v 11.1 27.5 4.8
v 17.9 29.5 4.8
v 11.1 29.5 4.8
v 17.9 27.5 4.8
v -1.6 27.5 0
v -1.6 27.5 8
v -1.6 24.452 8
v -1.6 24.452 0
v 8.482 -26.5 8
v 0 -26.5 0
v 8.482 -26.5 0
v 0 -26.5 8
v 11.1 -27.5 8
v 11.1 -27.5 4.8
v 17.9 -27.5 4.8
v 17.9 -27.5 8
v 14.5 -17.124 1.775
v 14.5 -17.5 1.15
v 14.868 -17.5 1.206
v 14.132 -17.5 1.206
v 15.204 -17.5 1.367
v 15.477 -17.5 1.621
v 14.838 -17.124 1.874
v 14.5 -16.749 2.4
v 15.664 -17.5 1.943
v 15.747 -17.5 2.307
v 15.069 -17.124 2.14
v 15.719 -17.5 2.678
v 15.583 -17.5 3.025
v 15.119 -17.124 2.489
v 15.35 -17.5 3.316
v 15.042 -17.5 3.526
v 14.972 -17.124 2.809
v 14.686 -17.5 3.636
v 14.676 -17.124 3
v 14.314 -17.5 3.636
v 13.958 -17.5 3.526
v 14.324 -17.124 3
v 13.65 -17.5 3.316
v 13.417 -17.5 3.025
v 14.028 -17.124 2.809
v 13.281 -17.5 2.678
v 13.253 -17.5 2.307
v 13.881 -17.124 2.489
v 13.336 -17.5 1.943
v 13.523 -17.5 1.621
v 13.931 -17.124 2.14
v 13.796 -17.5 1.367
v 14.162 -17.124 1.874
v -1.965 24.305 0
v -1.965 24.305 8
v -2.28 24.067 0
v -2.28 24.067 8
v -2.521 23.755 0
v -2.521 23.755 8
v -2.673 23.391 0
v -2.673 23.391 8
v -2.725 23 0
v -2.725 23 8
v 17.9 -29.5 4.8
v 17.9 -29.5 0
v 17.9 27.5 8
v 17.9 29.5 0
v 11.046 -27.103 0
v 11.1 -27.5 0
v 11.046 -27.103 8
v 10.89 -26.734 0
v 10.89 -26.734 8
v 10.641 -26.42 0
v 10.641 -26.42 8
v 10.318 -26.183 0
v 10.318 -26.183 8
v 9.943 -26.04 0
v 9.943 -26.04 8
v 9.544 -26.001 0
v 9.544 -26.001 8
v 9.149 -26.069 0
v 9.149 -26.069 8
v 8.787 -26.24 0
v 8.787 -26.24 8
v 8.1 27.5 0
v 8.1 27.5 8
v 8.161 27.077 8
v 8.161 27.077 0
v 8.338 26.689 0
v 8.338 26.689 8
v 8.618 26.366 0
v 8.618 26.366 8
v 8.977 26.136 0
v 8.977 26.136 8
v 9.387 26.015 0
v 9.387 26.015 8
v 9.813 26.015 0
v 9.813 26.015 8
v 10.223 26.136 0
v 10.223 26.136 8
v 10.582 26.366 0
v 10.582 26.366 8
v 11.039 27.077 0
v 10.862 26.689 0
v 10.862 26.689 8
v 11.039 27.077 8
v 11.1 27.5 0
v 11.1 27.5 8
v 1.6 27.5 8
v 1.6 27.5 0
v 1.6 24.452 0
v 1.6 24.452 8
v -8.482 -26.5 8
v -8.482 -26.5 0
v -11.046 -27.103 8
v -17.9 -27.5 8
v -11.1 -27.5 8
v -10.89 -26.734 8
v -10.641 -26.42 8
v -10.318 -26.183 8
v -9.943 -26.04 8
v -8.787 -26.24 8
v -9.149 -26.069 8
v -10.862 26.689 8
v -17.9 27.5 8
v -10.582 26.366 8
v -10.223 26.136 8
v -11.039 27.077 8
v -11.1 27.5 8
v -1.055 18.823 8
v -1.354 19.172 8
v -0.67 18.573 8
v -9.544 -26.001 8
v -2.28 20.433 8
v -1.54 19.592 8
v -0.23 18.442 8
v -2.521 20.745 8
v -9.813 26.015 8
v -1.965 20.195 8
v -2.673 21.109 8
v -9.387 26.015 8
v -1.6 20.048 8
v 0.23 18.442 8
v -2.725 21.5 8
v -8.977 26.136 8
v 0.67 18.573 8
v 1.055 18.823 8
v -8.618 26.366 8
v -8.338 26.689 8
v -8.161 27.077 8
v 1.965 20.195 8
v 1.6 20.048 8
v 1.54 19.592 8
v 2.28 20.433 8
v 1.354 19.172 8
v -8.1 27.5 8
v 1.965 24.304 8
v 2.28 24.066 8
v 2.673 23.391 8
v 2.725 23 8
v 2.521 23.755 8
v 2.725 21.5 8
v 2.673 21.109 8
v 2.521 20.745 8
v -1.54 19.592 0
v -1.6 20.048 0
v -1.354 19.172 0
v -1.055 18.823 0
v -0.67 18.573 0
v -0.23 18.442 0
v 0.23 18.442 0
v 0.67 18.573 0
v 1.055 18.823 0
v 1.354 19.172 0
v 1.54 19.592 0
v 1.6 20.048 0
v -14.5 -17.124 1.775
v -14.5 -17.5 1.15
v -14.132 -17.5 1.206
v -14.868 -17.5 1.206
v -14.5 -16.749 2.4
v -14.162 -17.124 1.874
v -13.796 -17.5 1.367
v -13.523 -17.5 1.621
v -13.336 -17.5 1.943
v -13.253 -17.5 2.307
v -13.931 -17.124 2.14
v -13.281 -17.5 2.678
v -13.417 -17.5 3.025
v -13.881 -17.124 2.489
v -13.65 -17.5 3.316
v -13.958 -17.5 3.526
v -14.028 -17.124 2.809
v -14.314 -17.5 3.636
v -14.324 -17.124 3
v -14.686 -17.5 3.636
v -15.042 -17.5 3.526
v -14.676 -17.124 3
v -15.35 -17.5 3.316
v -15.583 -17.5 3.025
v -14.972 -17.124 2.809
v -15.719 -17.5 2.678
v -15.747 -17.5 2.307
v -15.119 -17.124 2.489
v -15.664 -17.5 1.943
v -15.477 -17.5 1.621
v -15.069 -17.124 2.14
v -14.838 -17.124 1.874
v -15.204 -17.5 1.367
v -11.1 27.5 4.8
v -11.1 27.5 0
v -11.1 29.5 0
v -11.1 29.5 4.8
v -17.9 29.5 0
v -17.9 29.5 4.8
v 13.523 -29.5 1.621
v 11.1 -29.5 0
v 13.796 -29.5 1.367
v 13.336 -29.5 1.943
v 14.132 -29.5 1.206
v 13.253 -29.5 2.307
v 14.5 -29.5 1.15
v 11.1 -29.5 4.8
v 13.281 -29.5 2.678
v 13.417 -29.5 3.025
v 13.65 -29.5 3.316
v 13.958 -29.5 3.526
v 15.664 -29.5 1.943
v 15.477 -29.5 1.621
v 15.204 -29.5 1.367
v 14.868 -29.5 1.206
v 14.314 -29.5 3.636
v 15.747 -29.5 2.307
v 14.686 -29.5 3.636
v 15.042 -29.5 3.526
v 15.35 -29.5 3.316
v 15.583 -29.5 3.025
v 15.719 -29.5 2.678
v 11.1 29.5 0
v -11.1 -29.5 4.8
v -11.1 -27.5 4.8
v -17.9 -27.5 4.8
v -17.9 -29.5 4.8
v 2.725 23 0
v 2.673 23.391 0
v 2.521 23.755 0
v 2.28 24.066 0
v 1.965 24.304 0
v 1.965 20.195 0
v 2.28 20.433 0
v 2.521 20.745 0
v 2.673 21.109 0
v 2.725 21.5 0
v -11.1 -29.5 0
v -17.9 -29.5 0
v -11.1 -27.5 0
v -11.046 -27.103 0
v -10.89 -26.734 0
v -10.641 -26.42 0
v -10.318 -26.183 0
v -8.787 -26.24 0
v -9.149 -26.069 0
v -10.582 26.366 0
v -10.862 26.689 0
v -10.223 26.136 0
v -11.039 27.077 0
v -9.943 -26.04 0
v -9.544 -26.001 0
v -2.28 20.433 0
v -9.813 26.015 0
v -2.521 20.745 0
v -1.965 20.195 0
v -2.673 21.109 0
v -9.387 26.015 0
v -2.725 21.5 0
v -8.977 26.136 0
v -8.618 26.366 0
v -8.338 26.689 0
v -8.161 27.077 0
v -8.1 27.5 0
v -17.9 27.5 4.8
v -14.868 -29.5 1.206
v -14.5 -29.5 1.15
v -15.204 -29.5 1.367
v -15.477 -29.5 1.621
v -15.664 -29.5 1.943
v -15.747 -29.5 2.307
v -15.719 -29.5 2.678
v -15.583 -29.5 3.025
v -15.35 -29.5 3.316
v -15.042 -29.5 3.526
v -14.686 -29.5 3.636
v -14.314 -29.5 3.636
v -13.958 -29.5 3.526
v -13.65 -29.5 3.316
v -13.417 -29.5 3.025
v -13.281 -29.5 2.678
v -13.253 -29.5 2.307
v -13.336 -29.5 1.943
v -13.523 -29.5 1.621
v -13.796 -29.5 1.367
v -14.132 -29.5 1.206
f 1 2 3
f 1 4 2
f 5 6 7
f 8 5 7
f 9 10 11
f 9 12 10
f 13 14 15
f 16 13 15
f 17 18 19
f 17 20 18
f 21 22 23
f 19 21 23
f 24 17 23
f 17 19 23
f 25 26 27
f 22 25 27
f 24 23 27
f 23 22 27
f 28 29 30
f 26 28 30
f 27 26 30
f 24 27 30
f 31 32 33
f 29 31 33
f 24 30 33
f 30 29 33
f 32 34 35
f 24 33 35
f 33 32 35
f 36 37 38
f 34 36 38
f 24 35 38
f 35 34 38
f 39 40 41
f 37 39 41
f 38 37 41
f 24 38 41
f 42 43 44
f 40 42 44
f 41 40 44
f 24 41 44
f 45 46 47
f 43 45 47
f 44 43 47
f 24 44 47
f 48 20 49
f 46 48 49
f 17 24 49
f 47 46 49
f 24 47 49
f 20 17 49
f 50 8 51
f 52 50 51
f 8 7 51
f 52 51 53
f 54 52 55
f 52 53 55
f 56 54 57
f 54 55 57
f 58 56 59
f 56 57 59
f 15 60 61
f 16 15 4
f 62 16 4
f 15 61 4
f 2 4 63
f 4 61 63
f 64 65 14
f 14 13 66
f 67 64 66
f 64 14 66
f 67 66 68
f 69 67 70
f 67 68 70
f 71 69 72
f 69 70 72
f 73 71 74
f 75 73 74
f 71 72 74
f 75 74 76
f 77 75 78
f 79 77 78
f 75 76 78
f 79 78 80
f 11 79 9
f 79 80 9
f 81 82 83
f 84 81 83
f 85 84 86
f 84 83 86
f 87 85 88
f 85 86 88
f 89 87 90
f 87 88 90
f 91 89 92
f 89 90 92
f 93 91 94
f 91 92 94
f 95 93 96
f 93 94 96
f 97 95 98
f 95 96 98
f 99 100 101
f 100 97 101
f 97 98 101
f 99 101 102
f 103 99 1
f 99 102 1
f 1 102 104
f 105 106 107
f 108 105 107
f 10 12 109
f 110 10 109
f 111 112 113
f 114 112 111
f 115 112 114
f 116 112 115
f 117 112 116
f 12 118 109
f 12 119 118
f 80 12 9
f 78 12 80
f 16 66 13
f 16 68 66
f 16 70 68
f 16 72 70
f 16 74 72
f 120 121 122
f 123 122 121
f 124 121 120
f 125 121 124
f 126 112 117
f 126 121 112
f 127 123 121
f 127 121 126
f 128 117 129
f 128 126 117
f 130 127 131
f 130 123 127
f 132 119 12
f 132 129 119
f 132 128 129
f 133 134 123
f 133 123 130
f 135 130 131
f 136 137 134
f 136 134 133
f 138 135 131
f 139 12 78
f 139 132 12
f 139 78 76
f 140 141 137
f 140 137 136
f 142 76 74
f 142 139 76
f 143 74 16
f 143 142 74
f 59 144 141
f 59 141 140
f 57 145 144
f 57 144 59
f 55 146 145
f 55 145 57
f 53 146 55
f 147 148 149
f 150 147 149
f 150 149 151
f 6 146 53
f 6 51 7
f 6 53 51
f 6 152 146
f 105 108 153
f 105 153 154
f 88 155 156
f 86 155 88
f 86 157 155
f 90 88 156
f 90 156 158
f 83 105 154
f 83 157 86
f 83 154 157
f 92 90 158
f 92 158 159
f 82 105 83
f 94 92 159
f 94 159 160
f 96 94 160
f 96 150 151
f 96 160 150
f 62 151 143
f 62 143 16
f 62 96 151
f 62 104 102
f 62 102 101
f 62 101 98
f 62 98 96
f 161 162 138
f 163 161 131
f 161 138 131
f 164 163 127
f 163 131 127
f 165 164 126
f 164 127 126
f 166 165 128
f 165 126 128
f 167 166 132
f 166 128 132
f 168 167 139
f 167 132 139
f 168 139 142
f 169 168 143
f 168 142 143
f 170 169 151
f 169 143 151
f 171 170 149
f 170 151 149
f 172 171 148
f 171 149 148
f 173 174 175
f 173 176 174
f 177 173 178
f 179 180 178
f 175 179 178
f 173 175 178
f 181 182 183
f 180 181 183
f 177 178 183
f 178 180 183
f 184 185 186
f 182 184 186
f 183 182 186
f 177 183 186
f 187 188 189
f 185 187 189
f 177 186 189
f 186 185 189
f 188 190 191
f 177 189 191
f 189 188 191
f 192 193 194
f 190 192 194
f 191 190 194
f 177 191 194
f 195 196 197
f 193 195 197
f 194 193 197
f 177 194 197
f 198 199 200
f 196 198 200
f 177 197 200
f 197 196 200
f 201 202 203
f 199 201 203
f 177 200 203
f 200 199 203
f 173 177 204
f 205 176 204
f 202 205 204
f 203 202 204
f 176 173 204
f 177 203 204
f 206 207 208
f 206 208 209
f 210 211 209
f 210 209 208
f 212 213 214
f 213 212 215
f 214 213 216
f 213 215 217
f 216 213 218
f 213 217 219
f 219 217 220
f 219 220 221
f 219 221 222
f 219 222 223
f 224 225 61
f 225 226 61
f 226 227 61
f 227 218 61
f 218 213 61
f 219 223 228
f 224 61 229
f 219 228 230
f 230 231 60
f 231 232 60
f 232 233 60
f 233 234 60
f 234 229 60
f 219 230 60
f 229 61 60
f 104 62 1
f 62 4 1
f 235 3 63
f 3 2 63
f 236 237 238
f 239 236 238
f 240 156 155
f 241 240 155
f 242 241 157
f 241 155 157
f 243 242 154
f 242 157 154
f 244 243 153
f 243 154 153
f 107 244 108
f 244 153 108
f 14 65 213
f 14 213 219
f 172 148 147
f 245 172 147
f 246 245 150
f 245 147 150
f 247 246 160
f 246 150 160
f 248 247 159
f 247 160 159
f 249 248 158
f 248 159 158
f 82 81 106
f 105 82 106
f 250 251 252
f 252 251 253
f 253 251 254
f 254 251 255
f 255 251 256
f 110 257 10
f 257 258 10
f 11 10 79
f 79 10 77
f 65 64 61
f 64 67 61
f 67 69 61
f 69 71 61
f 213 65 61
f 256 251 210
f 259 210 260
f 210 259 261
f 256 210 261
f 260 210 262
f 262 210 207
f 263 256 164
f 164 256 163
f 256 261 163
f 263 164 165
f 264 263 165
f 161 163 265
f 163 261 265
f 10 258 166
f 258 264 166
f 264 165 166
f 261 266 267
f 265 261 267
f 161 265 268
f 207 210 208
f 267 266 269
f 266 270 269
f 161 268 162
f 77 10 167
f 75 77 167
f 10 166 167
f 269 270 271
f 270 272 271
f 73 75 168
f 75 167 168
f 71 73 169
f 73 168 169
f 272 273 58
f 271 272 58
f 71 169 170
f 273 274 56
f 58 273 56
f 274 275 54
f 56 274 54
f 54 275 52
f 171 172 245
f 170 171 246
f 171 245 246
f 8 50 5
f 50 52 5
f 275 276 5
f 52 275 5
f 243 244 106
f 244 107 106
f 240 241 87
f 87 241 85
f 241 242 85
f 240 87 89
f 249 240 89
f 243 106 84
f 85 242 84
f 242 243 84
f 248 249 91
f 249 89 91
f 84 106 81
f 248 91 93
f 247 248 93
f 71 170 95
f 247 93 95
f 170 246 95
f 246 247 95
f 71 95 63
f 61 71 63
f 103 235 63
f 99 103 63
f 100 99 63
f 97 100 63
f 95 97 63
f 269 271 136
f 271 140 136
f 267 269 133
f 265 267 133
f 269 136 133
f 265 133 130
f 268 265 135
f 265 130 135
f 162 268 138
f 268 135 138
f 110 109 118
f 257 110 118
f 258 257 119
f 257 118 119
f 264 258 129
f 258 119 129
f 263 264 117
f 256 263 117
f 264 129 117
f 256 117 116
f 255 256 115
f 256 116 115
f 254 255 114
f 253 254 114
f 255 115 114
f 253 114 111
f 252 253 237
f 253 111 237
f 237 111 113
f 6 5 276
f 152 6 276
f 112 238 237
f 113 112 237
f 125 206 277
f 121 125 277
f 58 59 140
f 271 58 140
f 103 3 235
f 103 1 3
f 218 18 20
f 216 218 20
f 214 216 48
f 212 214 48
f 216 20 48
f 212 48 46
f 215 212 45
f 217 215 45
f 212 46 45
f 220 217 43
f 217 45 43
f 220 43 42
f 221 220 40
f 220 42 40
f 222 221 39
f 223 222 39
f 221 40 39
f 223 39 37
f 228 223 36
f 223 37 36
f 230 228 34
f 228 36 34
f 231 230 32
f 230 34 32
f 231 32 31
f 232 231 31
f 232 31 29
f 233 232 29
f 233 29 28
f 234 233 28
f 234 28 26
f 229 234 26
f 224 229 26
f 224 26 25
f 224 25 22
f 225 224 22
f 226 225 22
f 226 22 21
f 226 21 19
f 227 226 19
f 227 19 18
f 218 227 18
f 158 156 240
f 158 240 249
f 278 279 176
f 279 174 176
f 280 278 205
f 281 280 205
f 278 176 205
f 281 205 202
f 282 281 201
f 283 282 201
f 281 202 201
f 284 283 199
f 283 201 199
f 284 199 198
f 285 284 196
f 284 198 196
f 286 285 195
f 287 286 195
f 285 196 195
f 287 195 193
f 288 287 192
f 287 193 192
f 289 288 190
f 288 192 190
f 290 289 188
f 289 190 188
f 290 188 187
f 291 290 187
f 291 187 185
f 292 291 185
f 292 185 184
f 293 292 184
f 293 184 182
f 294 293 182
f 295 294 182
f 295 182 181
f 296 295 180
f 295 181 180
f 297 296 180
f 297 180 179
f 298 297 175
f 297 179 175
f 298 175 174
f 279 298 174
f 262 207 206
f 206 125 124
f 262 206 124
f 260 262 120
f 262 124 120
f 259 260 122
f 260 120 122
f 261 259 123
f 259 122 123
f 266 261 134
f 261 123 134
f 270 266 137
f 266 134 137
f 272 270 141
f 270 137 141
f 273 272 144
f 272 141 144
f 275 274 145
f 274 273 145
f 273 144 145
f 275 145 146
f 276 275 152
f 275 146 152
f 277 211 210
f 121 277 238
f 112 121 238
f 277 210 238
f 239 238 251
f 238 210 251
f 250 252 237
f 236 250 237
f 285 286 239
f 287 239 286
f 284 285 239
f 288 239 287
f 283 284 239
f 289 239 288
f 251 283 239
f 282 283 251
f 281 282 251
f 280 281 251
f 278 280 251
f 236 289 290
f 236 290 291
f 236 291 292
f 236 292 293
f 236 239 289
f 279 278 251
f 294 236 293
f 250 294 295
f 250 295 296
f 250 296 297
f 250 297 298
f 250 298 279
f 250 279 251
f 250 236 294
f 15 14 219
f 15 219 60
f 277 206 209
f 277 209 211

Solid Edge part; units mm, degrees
sketch "Sketch1" plane through (0, 0, 0) normal (0, 0, 1) x (1, 0, 0)
  line L0 (-17.9, -27.5) -> (17.9, -27.5)
  line L1 (17.9, -27.5) -> (17.9, 27.5)
  line L2 (17.9, 27.5) -> (-17.9, 27.5)
  line L3 (-17.9, 27.5) -> (-17.9, -27.5)
extrude "Protrusion1" add sketch "Sketch1" along normal blind 8
sketch "Sketch2" plane through (0, -27.5, 4) normal (0, -1, 0) x (1, 0, 0)
  line L0 (-11.1, 0.8) -> (-17.9, 0.8)
  line L1 (-17.9, 0.8) -> (-17.9, -4)
  line L2 (-17.9, -4) -> (-11.1, -4)
  line L3 (-11.1, -4) -> (-11.1, 0.8)
  line L4 (11.1, 0.8) -> (17.9, 0.8)
  line L5 (17.9, 0.8) -> (17.9, -4)
  line L6 (17.9, -4) -> (11.1, -4)
  line L7 (11.1, -4) -> (11.1, 0.8)
extrude "ExtrudedProtrusion_2" add sketch "Sketch2" along normal blind 2
sketch "Sketch3" plane through (0, 27.5, 4) normal (0, 1, 0) x (-1, 0, 0)
  line L0 (-17.9, 0.8) -> (-11.1, 0.8)
  line L1 (-11.1, 0.8) -> (-11.1, -4)
  line L2 (-11.1, -4) -> (-17.9, -4)
  line L3 (-17.9, -4) -> (-17.9, 0.8)
  line L4 (11.1, 0.8) -> (17.9, 0.8)
  line L5 (17.9, 0.8) -> (17.9, -4)
  line L6 (17.9, -4) -> (11.1, -4)
  line L7 (11.1, -4) -> (11.1, 0.8)
extrude "ExtrudedProtrusion_3" add sketch "Sketch3" along normal blind 2
hole "Hole_3" at (-14.5, -29.5, 2.4) direction (0, 1, 0) diameter 2.5 depth 12 tip angle 118
hole "Hole1" at (14.5, -29.5, 2.4) direction (0, 1, 0) diameter 2.5 depth 12 tip angle 118
sketch "Sketch4" plane through (0, 0, 8) normal (0, 0, 1) x (0, -1, 0)
  line L0 (26.5, 0) -> (26.5, -8.482)
  arc A0 (26.5, -8.482) -> (27.5, -11.1) centre (27.5, -9.6) ccw
  line L1 (27.5, 11.1) -> (27.5, -11.1)
  arc A1 (27.5, 11.1) -> (26.5, 8.482) centre (27.5, 9.6) ccw
  line L2 (26.5, 0) -> (26.5, 8.482)
  arc A2 (-27.5, -8.1) -> (-27.5, -11.1) centre (-27.5, -9.6) cw
  line L3 (-27.5, -11.1) -> (-27.5, -8.1)
  arc A3 (-27.5, 11.1) -> (-27.5, 8.1) centre (-27.5, 9.6) cw
  line L4 (-27.5, 11.1) -> (-27.5, 8.1)
extrude "ExtrudedCutout_1" cut sketch "Sketch4" against normal blind 8
sketch "Sketch5" plane through (0, 0, 8) normal (0, 0, 1) x (1, 0, 0)
  arc A0 (1.6, 24.4524) -> (2.725, 23) centre (1.225, 23) cw
  line L0 (2.725, 23) -> (2.725, 21.5)
  arc A1 (2.725, 21.5) -> (1.5998, 20.0476) centre (1.225, 21.5) cw
  arc A2 (1.5998, 20.0476) -> (-1.5998, 20.0476) centre (0, 20.0254) cw
  arc A3 (-2.725, 21.5) -> (-1.5998, 20.0476) centre (-1.225, 21.5) ccw
  line L1 (-2.725, 23) -> (-2.725, 21.5)
  arc A4 (-1.5998, 24.4524) -> (-2.725, 23) centre (-1.225, 23) ccw
  line L2 (-1.5998, 27.5) -> (-1.5998, 24.4524)
  line L3 (0, 27.5) -> (-1.5998, 27.5)
  line L4 (0, 27.5) -> (1.6, 27.5)
  line L5 (1.6, 27.5) -> (1.6, 24.4524)
extrude "Cutout1" cut sketch "Sketch5" against normal up to next
properties material "Polycarbonate"
